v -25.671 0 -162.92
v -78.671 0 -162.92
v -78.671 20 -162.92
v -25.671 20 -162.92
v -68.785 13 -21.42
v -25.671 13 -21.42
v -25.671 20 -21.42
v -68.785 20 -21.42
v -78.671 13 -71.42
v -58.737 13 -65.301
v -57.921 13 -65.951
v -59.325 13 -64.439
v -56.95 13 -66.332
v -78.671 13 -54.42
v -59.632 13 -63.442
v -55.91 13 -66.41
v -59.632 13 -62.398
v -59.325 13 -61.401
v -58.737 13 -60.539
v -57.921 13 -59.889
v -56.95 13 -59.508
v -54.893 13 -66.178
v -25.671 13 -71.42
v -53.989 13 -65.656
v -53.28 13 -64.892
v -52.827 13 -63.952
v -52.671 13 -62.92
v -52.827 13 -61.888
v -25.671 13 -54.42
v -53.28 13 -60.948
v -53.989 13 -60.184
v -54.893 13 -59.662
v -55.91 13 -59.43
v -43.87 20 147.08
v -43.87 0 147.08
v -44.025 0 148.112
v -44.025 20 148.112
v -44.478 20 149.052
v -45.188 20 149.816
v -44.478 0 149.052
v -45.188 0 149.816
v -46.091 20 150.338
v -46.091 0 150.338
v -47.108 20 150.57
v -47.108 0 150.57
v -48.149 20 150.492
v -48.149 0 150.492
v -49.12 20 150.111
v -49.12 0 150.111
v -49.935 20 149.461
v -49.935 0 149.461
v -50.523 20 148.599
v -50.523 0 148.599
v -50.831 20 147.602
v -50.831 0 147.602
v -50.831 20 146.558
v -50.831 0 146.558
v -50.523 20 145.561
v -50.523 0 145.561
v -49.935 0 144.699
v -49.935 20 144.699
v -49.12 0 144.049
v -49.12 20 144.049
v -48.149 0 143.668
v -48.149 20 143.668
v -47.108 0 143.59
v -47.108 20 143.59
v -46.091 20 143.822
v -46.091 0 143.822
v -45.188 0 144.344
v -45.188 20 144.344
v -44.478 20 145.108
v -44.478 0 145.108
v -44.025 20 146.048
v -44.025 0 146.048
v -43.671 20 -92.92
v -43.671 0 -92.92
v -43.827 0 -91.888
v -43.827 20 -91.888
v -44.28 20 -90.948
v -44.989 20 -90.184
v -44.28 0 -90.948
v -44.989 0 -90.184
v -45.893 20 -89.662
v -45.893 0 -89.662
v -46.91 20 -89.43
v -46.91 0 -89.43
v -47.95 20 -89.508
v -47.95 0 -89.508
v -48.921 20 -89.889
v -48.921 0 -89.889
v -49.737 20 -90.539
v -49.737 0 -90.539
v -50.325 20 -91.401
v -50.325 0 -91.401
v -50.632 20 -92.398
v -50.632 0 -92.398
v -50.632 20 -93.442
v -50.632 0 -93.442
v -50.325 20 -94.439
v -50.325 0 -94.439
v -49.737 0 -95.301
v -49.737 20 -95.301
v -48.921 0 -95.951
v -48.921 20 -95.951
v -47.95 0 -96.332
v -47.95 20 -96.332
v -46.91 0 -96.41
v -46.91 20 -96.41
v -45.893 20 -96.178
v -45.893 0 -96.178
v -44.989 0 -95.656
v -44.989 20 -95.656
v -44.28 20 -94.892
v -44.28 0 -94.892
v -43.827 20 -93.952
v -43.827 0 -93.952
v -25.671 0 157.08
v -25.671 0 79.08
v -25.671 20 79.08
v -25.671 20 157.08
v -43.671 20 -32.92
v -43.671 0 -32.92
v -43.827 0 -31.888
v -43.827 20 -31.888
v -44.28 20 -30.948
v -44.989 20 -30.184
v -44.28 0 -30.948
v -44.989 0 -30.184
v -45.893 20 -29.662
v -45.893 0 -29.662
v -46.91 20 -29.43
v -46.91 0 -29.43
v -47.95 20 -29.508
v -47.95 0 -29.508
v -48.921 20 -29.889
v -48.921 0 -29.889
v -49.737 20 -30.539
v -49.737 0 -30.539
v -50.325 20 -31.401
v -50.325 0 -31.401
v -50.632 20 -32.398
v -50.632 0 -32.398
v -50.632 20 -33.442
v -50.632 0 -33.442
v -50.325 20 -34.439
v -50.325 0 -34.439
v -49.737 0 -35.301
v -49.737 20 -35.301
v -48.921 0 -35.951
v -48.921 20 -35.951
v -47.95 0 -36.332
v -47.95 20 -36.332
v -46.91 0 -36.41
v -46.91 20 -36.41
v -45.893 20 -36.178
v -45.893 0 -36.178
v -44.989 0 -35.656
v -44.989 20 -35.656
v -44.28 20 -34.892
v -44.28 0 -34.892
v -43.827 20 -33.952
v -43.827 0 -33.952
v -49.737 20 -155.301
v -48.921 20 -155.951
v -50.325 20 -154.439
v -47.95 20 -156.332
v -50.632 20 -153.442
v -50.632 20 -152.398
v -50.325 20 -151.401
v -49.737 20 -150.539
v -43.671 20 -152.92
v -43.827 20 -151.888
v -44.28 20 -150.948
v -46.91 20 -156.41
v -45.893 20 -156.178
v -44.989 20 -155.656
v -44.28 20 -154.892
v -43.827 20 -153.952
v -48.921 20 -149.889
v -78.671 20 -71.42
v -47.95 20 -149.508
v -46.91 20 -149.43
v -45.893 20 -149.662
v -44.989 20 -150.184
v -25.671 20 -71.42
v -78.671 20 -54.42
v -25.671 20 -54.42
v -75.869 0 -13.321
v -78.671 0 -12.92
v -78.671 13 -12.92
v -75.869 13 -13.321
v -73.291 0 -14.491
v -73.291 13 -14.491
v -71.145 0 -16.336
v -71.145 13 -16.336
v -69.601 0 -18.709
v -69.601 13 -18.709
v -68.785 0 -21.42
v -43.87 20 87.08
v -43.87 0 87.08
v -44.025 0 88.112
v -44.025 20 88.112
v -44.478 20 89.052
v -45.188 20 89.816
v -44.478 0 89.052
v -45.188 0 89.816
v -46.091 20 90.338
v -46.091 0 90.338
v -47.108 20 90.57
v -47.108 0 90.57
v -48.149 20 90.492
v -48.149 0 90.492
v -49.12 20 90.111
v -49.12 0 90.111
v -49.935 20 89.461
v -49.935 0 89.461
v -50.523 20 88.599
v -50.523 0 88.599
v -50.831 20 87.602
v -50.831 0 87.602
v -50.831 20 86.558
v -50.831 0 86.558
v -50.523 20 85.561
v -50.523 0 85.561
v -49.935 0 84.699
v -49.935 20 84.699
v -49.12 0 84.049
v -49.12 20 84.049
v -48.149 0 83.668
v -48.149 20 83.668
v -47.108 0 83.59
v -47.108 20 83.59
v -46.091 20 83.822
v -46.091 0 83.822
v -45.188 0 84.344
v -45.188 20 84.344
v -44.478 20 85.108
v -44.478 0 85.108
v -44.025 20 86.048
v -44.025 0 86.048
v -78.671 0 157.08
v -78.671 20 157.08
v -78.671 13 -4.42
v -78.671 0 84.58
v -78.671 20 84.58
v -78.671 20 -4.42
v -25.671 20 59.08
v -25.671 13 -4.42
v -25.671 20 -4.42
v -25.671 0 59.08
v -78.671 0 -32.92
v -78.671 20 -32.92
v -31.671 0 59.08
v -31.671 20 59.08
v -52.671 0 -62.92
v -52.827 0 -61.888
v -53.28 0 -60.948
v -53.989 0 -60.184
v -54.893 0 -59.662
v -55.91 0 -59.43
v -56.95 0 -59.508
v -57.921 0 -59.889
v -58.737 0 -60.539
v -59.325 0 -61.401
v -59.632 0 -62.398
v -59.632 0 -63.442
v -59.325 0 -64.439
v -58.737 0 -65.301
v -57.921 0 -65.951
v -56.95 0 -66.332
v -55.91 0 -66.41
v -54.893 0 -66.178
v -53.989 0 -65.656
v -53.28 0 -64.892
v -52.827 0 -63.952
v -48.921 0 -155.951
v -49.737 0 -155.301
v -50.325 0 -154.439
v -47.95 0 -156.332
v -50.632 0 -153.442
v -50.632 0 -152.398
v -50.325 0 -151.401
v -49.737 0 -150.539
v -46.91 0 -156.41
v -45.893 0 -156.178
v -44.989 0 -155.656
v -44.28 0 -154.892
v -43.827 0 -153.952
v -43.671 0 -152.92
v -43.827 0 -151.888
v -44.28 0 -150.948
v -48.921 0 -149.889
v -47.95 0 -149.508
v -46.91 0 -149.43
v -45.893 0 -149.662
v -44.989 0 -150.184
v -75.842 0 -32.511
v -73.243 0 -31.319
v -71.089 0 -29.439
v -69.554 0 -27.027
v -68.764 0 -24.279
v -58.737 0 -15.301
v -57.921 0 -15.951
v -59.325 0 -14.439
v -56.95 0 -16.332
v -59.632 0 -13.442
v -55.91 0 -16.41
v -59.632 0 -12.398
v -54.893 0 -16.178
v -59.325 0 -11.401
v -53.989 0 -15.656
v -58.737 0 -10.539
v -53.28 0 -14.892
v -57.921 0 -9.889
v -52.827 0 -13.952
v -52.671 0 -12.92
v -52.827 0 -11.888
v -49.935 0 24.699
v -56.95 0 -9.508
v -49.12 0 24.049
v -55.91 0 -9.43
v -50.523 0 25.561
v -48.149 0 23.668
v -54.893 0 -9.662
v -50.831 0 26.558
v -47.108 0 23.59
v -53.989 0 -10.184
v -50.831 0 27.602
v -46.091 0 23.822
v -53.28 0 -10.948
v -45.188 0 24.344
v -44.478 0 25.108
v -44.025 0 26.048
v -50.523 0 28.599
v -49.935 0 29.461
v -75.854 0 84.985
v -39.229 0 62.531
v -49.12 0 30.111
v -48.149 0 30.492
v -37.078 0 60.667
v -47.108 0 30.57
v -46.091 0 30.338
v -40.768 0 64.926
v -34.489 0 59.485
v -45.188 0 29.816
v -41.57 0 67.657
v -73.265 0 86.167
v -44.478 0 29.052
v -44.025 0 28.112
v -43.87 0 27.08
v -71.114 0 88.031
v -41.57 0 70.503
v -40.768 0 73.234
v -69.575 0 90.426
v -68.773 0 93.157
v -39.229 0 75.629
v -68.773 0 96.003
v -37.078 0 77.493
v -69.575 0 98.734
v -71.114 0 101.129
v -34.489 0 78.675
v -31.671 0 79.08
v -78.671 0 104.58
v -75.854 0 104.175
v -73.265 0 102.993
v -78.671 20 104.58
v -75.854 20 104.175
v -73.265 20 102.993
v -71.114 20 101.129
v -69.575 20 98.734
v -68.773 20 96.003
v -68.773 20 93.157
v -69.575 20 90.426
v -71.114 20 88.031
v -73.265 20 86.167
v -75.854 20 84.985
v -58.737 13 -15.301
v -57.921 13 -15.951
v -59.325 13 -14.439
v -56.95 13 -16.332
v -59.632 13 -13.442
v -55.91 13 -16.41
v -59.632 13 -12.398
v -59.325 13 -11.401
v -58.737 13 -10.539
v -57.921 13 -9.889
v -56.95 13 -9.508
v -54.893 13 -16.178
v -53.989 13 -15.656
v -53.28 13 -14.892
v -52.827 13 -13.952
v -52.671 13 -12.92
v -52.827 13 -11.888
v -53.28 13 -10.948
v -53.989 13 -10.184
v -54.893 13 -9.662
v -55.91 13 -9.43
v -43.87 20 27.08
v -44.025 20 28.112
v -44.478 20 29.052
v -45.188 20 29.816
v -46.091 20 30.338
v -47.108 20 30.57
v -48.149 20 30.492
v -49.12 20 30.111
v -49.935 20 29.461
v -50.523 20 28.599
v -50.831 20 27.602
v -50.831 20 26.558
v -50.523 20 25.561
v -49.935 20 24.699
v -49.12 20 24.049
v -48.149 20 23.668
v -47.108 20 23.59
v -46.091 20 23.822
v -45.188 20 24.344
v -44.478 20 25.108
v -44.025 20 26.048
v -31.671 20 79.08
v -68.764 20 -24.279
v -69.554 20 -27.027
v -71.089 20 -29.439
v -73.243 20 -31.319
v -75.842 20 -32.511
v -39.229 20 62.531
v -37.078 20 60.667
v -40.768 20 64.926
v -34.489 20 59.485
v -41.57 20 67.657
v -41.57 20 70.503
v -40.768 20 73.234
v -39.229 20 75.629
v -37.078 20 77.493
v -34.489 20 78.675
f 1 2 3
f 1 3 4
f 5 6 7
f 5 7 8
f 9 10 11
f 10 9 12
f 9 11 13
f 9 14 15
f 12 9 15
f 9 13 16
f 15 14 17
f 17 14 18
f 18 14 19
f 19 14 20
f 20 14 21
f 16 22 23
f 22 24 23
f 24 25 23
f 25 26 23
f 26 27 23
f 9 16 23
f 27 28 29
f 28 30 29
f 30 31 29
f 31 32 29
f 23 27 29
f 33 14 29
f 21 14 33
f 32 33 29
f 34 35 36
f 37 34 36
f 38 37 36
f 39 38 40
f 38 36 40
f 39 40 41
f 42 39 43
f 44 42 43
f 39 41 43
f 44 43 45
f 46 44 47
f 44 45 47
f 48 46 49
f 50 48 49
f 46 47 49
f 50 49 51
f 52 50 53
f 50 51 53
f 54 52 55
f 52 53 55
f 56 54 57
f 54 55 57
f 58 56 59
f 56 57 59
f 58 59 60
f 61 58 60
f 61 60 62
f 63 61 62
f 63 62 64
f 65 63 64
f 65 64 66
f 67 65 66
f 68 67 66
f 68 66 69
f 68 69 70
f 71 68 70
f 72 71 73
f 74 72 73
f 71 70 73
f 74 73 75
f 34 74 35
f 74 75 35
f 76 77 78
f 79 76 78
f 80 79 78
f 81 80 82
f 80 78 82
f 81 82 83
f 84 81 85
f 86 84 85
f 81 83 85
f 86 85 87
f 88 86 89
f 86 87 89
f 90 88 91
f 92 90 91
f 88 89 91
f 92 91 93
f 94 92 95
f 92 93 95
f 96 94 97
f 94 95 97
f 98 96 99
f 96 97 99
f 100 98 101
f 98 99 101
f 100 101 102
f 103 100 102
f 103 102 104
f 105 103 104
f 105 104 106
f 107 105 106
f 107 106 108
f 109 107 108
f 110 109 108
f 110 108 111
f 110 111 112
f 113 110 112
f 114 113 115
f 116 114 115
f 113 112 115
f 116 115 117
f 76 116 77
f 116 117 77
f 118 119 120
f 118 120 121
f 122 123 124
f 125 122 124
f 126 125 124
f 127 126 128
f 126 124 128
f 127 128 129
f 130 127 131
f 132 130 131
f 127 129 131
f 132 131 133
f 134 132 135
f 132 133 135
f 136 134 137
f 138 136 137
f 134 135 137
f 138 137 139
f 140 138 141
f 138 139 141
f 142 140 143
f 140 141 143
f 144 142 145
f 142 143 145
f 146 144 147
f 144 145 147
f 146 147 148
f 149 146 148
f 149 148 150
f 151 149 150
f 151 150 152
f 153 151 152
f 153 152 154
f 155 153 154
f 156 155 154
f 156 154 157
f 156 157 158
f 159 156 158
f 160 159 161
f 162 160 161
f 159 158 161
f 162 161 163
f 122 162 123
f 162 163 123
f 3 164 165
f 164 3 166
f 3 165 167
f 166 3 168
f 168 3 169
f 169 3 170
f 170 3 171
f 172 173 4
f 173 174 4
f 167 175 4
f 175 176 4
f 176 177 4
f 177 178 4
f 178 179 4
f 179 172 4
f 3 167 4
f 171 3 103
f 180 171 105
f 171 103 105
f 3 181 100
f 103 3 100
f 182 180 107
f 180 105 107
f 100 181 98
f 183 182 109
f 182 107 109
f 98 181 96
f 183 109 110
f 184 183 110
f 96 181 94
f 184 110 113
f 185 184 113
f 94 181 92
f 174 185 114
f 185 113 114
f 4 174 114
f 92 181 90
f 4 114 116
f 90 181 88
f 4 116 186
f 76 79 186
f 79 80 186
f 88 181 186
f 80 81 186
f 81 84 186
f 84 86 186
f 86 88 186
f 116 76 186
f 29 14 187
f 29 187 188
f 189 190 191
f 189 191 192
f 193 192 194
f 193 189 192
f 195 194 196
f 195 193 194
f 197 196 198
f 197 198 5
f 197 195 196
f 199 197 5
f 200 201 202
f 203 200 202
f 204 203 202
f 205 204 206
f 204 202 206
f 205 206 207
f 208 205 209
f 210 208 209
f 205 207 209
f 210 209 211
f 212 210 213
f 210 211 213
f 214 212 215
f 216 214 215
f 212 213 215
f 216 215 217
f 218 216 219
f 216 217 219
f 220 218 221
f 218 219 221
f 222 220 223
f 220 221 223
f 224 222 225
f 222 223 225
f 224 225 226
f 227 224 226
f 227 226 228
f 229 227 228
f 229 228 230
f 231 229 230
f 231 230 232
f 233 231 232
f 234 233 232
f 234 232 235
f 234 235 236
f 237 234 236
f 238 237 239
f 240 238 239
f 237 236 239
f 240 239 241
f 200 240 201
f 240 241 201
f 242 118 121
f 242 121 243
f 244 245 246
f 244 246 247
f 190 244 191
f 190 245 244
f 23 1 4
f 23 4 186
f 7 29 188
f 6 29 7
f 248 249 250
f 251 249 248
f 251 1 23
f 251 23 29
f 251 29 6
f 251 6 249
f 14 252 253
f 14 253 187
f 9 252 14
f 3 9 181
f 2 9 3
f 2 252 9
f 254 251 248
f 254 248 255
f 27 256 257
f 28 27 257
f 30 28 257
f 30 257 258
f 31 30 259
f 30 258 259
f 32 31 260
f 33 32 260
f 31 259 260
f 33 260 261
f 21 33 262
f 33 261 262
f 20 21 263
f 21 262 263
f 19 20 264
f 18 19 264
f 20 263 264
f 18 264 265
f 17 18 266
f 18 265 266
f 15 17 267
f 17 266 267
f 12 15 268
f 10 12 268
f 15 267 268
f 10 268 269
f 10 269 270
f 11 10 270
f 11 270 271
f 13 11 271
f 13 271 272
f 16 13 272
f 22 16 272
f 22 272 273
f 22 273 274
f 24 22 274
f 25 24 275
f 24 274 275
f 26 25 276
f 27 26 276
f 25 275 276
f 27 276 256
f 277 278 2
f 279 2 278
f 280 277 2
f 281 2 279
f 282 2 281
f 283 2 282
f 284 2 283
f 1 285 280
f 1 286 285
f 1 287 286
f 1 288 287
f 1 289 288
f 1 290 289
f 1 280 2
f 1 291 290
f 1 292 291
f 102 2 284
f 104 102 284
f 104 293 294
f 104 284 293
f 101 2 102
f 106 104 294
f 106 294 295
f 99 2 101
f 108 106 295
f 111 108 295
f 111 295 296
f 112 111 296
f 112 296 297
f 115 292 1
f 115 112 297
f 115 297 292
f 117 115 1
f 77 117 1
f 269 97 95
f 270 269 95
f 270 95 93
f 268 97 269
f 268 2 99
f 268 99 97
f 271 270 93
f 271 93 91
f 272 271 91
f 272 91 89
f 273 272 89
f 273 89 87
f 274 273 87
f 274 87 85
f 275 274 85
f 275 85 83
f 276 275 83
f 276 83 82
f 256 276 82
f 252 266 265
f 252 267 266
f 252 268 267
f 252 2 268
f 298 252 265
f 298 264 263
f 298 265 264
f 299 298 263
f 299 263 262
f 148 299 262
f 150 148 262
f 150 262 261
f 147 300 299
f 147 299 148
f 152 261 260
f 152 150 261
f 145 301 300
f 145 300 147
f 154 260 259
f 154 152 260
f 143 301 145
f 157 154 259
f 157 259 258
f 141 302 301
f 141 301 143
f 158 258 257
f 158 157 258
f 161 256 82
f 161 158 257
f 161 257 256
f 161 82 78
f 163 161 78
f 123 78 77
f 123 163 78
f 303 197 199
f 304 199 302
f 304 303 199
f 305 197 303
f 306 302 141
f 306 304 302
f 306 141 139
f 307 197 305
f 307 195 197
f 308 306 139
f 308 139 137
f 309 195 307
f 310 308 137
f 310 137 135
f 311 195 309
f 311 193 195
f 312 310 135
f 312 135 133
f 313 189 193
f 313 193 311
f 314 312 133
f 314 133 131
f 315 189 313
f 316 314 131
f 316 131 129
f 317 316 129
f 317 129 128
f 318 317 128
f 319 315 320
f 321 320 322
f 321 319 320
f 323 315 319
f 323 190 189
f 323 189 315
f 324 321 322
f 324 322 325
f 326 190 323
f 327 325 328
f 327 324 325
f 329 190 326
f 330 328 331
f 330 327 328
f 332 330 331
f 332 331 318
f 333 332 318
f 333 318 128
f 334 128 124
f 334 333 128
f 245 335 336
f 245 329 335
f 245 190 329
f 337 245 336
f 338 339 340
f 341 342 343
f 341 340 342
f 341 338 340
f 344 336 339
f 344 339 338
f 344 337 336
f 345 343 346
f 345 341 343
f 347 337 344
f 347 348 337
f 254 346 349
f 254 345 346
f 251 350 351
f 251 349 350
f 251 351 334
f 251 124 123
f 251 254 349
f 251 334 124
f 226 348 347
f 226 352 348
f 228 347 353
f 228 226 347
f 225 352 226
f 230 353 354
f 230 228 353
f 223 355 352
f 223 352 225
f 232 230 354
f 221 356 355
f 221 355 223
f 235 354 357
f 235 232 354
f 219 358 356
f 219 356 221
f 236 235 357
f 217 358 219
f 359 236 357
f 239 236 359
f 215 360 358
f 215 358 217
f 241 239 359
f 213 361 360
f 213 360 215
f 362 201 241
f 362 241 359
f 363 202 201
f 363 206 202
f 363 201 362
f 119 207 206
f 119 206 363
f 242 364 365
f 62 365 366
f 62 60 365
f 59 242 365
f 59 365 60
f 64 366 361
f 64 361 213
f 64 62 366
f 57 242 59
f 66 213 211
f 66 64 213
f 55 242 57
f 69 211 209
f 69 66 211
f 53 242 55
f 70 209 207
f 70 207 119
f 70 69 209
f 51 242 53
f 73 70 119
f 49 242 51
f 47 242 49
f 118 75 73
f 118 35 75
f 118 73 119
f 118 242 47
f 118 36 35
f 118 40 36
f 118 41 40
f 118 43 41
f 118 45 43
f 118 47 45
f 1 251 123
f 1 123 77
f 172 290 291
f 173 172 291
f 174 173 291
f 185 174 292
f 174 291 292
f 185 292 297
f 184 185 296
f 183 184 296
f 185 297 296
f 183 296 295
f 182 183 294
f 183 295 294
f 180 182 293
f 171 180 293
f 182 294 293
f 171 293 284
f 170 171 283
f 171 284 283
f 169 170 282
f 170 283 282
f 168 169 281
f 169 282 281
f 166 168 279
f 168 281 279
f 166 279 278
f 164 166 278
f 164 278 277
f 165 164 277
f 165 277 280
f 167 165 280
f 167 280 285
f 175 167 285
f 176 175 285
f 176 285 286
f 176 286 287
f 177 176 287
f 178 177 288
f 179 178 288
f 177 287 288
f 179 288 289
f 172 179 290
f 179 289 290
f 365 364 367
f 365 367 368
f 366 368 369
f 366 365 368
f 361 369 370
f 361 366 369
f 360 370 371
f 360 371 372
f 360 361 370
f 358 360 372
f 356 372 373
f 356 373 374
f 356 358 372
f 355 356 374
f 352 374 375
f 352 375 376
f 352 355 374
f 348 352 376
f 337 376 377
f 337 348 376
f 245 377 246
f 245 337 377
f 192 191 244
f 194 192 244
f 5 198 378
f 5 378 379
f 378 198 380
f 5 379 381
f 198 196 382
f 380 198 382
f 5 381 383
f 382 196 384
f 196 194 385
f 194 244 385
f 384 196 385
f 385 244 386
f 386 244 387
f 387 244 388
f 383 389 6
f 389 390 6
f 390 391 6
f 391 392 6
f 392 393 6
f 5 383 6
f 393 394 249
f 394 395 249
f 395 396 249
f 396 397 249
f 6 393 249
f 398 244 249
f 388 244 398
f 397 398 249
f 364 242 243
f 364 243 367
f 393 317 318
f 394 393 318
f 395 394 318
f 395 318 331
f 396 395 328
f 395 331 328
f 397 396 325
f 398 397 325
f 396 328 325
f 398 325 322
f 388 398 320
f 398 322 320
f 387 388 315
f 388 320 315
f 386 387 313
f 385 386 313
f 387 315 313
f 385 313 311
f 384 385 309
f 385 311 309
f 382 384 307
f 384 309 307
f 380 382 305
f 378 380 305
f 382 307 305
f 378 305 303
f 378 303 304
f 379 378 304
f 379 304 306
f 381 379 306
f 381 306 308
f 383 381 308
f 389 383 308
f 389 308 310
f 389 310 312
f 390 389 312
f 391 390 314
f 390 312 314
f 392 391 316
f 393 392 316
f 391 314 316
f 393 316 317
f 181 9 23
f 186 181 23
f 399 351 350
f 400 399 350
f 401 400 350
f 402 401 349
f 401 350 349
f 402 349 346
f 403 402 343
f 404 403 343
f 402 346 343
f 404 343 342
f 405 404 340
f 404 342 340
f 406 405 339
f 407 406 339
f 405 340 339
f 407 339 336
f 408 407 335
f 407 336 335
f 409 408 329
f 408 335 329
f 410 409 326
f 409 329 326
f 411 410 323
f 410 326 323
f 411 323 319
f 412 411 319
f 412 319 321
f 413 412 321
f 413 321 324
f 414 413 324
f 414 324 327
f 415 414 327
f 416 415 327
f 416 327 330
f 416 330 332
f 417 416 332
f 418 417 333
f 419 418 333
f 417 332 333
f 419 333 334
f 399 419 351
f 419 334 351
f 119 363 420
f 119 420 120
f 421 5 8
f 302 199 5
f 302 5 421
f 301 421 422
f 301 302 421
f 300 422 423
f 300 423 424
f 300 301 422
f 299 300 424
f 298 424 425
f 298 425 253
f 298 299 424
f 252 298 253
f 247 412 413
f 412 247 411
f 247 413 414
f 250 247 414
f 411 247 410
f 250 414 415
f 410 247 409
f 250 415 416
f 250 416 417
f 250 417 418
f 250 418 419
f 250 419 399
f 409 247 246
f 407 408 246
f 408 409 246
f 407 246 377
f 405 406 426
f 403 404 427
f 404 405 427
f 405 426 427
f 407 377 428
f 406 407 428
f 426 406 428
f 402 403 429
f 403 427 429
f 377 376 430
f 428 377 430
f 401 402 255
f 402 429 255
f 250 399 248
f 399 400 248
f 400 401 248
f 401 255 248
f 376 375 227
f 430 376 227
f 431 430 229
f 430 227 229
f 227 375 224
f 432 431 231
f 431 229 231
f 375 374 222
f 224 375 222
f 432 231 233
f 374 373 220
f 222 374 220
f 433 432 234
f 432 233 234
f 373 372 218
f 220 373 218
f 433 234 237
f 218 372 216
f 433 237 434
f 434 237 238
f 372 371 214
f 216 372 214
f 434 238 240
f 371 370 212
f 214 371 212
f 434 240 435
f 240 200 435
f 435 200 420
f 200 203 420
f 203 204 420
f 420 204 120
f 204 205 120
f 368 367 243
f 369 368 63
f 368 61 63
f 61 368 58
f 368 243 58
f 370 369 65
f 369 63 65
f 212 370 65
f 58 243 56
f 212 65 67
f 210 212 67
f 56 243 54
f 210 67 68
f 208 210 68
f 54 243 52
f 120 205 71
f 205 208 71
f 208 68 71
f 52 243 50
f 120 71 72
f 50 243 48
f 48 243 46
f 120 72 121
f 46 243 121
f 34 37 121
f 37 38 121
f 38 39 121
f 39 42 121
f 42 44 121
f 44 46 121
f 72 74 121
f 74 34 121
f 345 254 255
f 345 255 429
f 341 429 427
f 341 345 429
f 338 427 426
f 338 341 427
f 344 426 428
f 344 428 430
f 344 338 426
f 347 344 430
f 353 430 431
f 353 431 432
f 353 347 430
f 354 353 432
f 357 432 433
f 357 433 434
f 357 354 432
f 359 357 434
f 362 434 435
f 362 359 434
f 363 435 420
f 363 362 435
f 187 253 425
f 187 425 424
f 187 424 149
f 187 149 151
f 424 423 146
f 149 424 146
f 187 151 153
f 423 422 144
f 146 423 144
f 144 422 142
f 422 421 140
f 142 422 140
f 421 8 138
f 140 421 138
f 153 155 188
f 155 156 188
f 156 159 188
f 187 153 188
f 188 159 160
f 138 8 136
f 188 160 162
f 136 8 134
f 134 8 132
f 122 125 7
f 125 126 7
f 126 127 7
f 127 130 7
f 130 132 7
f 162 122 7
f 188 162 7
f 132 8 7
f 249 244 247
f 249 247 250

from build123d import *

# Parameters (mm, degrees)
F0_R     = 3.5
F1_DEPTH = 20
F0_W     = 53
F0_H     = 91.5
F0_H_2   = 17
F2_DEPTH = 13


with BuildPart() as f1:
    # F0 (on Front) → F1 (new body)
    with BuildSketch(Plane.XZ):
        with BuildLine():
            Line((-25.671420519, 79.08), (-25.671420519, 157.08))
            Line((-25.671420519, 157.08), (-78.671420519, 157.08))
            Line((-78.671420519, 157.08), (-78.671420519, 104.58))
            ThreePointArc((-78.671420519, 104.58), (-68.671420519, 94.58), (-78.671420519, 84.58))
            Line((-78.671420519, 84.58), (-78.671420519, -4.42))
            Line((-78.671420519, -4.42), (-25.671420519, -4.42))
            Line((-25.671420519, -4.42), (-25.671420519, 59.08))
            Line((-25.671420519, 59.08), (-31.671420519, 59.08))
            ThreePointArc((-31.671420519, 59.08), (-41.671420519, 69.08), (-31.671420519, 79.08))
            Line((-31.671420519, 79.08), (-25.671420519, 79.08))
        make_face()
        with Locations((-47.3698007467, 27.08)):
            Circle(F0_R, mode=Mode.SUBTRACT)
        with Locations((-47.3698007467, 87.08)):
            Circle(F0_R, mode=Mode.SUBTRACT)
        with Locations((-47.3698007467, 147.08)):
            Circle(F0_R, mode=Mode.SUBTRACT)
    extrude(amount=-F1_DEPTH)



with BuildPart() as f1b:
    # F0 (on Front) → F1, piece 2 (new body)
    with BuildSketch(Plane.XZ):
        with BuildLine():
            Line((-25.671420519, -54.42), (-25.671420519, -21.42))
            Line((-25.671420519, -21.42), (-68.7845605524, -21.42))
            ThreePointArc((-68.7845605524, -21.42), (-71.088545075, -29.4392024052), (-78.671420519, -32.92))
            Line((-78.671420519, -32.92), (-78.671420519, -54.42))
            Line((-78.671420519, -54.42), (-25.671420519, -54.42))
        make_face()
        with Locations((-47.171420519, -32.92)):
            Circle(F0_R, mode=Mode.SUBTRACT)
    extrude(amount=-F1_DEPTH)


with BuildPart() as f1c:
    # F0 (on Front) → F1, piece 3 (new body)
    with BuildSketch(Plane.XZ):
        with Locations((-52.171420519, -117.17)):
            Rectangle(F0_W, F0_H)
        with Locations((-47.171420519, -152.92)):
            Circle(F0_R, mode=Mode.SUBTRACT)
        with Locations((-47.171420519, -92.92)):
            Circle(F0_R, mode=Mode.SUBTRACT)
    extrude(amount=-F1_DEPTH)


with BuildPart() as f1_1:
    add(f1.part)

    add(f1b.part)  # F2 merges F1b

    add(f1c.part)  # F2 merges F1c
    # F0 (on Front) → F2 (join)
    with BuildSketch(Plane.XZ):
        with BuildLine():
            Line((-25.671420519, -21.42), (-25.671420519, -4.42))
            Line((-25.671420519, -4.42), (-78.671420519, -4.42))
            Line((-78.671420519, -4.42), (-78.671420519, -12.92))
            ThreePointArc((-78.671420519, -12.92), (-72.1522181138, -15.3371245559), (-68.7845605524, -21.42))
            Line((-68.7845605524, -21.42), (-25.671420519, -21.42))
        make_face()
        with Locations((-56.171420519, -12.92)):
            Circle(F0_R, mode=Mode.SUBTRACT)
        with Locations((-52.171420519, -62.92)):
            Rectangle(F0_W, F0_H_2)
        with Locations((-56.171420519, -62.92)):
            Circle(F0_R, mode=Mode.SUBTRACT)
    extrude(amount=-F2_DEPTH)


solid = f1_1.part
